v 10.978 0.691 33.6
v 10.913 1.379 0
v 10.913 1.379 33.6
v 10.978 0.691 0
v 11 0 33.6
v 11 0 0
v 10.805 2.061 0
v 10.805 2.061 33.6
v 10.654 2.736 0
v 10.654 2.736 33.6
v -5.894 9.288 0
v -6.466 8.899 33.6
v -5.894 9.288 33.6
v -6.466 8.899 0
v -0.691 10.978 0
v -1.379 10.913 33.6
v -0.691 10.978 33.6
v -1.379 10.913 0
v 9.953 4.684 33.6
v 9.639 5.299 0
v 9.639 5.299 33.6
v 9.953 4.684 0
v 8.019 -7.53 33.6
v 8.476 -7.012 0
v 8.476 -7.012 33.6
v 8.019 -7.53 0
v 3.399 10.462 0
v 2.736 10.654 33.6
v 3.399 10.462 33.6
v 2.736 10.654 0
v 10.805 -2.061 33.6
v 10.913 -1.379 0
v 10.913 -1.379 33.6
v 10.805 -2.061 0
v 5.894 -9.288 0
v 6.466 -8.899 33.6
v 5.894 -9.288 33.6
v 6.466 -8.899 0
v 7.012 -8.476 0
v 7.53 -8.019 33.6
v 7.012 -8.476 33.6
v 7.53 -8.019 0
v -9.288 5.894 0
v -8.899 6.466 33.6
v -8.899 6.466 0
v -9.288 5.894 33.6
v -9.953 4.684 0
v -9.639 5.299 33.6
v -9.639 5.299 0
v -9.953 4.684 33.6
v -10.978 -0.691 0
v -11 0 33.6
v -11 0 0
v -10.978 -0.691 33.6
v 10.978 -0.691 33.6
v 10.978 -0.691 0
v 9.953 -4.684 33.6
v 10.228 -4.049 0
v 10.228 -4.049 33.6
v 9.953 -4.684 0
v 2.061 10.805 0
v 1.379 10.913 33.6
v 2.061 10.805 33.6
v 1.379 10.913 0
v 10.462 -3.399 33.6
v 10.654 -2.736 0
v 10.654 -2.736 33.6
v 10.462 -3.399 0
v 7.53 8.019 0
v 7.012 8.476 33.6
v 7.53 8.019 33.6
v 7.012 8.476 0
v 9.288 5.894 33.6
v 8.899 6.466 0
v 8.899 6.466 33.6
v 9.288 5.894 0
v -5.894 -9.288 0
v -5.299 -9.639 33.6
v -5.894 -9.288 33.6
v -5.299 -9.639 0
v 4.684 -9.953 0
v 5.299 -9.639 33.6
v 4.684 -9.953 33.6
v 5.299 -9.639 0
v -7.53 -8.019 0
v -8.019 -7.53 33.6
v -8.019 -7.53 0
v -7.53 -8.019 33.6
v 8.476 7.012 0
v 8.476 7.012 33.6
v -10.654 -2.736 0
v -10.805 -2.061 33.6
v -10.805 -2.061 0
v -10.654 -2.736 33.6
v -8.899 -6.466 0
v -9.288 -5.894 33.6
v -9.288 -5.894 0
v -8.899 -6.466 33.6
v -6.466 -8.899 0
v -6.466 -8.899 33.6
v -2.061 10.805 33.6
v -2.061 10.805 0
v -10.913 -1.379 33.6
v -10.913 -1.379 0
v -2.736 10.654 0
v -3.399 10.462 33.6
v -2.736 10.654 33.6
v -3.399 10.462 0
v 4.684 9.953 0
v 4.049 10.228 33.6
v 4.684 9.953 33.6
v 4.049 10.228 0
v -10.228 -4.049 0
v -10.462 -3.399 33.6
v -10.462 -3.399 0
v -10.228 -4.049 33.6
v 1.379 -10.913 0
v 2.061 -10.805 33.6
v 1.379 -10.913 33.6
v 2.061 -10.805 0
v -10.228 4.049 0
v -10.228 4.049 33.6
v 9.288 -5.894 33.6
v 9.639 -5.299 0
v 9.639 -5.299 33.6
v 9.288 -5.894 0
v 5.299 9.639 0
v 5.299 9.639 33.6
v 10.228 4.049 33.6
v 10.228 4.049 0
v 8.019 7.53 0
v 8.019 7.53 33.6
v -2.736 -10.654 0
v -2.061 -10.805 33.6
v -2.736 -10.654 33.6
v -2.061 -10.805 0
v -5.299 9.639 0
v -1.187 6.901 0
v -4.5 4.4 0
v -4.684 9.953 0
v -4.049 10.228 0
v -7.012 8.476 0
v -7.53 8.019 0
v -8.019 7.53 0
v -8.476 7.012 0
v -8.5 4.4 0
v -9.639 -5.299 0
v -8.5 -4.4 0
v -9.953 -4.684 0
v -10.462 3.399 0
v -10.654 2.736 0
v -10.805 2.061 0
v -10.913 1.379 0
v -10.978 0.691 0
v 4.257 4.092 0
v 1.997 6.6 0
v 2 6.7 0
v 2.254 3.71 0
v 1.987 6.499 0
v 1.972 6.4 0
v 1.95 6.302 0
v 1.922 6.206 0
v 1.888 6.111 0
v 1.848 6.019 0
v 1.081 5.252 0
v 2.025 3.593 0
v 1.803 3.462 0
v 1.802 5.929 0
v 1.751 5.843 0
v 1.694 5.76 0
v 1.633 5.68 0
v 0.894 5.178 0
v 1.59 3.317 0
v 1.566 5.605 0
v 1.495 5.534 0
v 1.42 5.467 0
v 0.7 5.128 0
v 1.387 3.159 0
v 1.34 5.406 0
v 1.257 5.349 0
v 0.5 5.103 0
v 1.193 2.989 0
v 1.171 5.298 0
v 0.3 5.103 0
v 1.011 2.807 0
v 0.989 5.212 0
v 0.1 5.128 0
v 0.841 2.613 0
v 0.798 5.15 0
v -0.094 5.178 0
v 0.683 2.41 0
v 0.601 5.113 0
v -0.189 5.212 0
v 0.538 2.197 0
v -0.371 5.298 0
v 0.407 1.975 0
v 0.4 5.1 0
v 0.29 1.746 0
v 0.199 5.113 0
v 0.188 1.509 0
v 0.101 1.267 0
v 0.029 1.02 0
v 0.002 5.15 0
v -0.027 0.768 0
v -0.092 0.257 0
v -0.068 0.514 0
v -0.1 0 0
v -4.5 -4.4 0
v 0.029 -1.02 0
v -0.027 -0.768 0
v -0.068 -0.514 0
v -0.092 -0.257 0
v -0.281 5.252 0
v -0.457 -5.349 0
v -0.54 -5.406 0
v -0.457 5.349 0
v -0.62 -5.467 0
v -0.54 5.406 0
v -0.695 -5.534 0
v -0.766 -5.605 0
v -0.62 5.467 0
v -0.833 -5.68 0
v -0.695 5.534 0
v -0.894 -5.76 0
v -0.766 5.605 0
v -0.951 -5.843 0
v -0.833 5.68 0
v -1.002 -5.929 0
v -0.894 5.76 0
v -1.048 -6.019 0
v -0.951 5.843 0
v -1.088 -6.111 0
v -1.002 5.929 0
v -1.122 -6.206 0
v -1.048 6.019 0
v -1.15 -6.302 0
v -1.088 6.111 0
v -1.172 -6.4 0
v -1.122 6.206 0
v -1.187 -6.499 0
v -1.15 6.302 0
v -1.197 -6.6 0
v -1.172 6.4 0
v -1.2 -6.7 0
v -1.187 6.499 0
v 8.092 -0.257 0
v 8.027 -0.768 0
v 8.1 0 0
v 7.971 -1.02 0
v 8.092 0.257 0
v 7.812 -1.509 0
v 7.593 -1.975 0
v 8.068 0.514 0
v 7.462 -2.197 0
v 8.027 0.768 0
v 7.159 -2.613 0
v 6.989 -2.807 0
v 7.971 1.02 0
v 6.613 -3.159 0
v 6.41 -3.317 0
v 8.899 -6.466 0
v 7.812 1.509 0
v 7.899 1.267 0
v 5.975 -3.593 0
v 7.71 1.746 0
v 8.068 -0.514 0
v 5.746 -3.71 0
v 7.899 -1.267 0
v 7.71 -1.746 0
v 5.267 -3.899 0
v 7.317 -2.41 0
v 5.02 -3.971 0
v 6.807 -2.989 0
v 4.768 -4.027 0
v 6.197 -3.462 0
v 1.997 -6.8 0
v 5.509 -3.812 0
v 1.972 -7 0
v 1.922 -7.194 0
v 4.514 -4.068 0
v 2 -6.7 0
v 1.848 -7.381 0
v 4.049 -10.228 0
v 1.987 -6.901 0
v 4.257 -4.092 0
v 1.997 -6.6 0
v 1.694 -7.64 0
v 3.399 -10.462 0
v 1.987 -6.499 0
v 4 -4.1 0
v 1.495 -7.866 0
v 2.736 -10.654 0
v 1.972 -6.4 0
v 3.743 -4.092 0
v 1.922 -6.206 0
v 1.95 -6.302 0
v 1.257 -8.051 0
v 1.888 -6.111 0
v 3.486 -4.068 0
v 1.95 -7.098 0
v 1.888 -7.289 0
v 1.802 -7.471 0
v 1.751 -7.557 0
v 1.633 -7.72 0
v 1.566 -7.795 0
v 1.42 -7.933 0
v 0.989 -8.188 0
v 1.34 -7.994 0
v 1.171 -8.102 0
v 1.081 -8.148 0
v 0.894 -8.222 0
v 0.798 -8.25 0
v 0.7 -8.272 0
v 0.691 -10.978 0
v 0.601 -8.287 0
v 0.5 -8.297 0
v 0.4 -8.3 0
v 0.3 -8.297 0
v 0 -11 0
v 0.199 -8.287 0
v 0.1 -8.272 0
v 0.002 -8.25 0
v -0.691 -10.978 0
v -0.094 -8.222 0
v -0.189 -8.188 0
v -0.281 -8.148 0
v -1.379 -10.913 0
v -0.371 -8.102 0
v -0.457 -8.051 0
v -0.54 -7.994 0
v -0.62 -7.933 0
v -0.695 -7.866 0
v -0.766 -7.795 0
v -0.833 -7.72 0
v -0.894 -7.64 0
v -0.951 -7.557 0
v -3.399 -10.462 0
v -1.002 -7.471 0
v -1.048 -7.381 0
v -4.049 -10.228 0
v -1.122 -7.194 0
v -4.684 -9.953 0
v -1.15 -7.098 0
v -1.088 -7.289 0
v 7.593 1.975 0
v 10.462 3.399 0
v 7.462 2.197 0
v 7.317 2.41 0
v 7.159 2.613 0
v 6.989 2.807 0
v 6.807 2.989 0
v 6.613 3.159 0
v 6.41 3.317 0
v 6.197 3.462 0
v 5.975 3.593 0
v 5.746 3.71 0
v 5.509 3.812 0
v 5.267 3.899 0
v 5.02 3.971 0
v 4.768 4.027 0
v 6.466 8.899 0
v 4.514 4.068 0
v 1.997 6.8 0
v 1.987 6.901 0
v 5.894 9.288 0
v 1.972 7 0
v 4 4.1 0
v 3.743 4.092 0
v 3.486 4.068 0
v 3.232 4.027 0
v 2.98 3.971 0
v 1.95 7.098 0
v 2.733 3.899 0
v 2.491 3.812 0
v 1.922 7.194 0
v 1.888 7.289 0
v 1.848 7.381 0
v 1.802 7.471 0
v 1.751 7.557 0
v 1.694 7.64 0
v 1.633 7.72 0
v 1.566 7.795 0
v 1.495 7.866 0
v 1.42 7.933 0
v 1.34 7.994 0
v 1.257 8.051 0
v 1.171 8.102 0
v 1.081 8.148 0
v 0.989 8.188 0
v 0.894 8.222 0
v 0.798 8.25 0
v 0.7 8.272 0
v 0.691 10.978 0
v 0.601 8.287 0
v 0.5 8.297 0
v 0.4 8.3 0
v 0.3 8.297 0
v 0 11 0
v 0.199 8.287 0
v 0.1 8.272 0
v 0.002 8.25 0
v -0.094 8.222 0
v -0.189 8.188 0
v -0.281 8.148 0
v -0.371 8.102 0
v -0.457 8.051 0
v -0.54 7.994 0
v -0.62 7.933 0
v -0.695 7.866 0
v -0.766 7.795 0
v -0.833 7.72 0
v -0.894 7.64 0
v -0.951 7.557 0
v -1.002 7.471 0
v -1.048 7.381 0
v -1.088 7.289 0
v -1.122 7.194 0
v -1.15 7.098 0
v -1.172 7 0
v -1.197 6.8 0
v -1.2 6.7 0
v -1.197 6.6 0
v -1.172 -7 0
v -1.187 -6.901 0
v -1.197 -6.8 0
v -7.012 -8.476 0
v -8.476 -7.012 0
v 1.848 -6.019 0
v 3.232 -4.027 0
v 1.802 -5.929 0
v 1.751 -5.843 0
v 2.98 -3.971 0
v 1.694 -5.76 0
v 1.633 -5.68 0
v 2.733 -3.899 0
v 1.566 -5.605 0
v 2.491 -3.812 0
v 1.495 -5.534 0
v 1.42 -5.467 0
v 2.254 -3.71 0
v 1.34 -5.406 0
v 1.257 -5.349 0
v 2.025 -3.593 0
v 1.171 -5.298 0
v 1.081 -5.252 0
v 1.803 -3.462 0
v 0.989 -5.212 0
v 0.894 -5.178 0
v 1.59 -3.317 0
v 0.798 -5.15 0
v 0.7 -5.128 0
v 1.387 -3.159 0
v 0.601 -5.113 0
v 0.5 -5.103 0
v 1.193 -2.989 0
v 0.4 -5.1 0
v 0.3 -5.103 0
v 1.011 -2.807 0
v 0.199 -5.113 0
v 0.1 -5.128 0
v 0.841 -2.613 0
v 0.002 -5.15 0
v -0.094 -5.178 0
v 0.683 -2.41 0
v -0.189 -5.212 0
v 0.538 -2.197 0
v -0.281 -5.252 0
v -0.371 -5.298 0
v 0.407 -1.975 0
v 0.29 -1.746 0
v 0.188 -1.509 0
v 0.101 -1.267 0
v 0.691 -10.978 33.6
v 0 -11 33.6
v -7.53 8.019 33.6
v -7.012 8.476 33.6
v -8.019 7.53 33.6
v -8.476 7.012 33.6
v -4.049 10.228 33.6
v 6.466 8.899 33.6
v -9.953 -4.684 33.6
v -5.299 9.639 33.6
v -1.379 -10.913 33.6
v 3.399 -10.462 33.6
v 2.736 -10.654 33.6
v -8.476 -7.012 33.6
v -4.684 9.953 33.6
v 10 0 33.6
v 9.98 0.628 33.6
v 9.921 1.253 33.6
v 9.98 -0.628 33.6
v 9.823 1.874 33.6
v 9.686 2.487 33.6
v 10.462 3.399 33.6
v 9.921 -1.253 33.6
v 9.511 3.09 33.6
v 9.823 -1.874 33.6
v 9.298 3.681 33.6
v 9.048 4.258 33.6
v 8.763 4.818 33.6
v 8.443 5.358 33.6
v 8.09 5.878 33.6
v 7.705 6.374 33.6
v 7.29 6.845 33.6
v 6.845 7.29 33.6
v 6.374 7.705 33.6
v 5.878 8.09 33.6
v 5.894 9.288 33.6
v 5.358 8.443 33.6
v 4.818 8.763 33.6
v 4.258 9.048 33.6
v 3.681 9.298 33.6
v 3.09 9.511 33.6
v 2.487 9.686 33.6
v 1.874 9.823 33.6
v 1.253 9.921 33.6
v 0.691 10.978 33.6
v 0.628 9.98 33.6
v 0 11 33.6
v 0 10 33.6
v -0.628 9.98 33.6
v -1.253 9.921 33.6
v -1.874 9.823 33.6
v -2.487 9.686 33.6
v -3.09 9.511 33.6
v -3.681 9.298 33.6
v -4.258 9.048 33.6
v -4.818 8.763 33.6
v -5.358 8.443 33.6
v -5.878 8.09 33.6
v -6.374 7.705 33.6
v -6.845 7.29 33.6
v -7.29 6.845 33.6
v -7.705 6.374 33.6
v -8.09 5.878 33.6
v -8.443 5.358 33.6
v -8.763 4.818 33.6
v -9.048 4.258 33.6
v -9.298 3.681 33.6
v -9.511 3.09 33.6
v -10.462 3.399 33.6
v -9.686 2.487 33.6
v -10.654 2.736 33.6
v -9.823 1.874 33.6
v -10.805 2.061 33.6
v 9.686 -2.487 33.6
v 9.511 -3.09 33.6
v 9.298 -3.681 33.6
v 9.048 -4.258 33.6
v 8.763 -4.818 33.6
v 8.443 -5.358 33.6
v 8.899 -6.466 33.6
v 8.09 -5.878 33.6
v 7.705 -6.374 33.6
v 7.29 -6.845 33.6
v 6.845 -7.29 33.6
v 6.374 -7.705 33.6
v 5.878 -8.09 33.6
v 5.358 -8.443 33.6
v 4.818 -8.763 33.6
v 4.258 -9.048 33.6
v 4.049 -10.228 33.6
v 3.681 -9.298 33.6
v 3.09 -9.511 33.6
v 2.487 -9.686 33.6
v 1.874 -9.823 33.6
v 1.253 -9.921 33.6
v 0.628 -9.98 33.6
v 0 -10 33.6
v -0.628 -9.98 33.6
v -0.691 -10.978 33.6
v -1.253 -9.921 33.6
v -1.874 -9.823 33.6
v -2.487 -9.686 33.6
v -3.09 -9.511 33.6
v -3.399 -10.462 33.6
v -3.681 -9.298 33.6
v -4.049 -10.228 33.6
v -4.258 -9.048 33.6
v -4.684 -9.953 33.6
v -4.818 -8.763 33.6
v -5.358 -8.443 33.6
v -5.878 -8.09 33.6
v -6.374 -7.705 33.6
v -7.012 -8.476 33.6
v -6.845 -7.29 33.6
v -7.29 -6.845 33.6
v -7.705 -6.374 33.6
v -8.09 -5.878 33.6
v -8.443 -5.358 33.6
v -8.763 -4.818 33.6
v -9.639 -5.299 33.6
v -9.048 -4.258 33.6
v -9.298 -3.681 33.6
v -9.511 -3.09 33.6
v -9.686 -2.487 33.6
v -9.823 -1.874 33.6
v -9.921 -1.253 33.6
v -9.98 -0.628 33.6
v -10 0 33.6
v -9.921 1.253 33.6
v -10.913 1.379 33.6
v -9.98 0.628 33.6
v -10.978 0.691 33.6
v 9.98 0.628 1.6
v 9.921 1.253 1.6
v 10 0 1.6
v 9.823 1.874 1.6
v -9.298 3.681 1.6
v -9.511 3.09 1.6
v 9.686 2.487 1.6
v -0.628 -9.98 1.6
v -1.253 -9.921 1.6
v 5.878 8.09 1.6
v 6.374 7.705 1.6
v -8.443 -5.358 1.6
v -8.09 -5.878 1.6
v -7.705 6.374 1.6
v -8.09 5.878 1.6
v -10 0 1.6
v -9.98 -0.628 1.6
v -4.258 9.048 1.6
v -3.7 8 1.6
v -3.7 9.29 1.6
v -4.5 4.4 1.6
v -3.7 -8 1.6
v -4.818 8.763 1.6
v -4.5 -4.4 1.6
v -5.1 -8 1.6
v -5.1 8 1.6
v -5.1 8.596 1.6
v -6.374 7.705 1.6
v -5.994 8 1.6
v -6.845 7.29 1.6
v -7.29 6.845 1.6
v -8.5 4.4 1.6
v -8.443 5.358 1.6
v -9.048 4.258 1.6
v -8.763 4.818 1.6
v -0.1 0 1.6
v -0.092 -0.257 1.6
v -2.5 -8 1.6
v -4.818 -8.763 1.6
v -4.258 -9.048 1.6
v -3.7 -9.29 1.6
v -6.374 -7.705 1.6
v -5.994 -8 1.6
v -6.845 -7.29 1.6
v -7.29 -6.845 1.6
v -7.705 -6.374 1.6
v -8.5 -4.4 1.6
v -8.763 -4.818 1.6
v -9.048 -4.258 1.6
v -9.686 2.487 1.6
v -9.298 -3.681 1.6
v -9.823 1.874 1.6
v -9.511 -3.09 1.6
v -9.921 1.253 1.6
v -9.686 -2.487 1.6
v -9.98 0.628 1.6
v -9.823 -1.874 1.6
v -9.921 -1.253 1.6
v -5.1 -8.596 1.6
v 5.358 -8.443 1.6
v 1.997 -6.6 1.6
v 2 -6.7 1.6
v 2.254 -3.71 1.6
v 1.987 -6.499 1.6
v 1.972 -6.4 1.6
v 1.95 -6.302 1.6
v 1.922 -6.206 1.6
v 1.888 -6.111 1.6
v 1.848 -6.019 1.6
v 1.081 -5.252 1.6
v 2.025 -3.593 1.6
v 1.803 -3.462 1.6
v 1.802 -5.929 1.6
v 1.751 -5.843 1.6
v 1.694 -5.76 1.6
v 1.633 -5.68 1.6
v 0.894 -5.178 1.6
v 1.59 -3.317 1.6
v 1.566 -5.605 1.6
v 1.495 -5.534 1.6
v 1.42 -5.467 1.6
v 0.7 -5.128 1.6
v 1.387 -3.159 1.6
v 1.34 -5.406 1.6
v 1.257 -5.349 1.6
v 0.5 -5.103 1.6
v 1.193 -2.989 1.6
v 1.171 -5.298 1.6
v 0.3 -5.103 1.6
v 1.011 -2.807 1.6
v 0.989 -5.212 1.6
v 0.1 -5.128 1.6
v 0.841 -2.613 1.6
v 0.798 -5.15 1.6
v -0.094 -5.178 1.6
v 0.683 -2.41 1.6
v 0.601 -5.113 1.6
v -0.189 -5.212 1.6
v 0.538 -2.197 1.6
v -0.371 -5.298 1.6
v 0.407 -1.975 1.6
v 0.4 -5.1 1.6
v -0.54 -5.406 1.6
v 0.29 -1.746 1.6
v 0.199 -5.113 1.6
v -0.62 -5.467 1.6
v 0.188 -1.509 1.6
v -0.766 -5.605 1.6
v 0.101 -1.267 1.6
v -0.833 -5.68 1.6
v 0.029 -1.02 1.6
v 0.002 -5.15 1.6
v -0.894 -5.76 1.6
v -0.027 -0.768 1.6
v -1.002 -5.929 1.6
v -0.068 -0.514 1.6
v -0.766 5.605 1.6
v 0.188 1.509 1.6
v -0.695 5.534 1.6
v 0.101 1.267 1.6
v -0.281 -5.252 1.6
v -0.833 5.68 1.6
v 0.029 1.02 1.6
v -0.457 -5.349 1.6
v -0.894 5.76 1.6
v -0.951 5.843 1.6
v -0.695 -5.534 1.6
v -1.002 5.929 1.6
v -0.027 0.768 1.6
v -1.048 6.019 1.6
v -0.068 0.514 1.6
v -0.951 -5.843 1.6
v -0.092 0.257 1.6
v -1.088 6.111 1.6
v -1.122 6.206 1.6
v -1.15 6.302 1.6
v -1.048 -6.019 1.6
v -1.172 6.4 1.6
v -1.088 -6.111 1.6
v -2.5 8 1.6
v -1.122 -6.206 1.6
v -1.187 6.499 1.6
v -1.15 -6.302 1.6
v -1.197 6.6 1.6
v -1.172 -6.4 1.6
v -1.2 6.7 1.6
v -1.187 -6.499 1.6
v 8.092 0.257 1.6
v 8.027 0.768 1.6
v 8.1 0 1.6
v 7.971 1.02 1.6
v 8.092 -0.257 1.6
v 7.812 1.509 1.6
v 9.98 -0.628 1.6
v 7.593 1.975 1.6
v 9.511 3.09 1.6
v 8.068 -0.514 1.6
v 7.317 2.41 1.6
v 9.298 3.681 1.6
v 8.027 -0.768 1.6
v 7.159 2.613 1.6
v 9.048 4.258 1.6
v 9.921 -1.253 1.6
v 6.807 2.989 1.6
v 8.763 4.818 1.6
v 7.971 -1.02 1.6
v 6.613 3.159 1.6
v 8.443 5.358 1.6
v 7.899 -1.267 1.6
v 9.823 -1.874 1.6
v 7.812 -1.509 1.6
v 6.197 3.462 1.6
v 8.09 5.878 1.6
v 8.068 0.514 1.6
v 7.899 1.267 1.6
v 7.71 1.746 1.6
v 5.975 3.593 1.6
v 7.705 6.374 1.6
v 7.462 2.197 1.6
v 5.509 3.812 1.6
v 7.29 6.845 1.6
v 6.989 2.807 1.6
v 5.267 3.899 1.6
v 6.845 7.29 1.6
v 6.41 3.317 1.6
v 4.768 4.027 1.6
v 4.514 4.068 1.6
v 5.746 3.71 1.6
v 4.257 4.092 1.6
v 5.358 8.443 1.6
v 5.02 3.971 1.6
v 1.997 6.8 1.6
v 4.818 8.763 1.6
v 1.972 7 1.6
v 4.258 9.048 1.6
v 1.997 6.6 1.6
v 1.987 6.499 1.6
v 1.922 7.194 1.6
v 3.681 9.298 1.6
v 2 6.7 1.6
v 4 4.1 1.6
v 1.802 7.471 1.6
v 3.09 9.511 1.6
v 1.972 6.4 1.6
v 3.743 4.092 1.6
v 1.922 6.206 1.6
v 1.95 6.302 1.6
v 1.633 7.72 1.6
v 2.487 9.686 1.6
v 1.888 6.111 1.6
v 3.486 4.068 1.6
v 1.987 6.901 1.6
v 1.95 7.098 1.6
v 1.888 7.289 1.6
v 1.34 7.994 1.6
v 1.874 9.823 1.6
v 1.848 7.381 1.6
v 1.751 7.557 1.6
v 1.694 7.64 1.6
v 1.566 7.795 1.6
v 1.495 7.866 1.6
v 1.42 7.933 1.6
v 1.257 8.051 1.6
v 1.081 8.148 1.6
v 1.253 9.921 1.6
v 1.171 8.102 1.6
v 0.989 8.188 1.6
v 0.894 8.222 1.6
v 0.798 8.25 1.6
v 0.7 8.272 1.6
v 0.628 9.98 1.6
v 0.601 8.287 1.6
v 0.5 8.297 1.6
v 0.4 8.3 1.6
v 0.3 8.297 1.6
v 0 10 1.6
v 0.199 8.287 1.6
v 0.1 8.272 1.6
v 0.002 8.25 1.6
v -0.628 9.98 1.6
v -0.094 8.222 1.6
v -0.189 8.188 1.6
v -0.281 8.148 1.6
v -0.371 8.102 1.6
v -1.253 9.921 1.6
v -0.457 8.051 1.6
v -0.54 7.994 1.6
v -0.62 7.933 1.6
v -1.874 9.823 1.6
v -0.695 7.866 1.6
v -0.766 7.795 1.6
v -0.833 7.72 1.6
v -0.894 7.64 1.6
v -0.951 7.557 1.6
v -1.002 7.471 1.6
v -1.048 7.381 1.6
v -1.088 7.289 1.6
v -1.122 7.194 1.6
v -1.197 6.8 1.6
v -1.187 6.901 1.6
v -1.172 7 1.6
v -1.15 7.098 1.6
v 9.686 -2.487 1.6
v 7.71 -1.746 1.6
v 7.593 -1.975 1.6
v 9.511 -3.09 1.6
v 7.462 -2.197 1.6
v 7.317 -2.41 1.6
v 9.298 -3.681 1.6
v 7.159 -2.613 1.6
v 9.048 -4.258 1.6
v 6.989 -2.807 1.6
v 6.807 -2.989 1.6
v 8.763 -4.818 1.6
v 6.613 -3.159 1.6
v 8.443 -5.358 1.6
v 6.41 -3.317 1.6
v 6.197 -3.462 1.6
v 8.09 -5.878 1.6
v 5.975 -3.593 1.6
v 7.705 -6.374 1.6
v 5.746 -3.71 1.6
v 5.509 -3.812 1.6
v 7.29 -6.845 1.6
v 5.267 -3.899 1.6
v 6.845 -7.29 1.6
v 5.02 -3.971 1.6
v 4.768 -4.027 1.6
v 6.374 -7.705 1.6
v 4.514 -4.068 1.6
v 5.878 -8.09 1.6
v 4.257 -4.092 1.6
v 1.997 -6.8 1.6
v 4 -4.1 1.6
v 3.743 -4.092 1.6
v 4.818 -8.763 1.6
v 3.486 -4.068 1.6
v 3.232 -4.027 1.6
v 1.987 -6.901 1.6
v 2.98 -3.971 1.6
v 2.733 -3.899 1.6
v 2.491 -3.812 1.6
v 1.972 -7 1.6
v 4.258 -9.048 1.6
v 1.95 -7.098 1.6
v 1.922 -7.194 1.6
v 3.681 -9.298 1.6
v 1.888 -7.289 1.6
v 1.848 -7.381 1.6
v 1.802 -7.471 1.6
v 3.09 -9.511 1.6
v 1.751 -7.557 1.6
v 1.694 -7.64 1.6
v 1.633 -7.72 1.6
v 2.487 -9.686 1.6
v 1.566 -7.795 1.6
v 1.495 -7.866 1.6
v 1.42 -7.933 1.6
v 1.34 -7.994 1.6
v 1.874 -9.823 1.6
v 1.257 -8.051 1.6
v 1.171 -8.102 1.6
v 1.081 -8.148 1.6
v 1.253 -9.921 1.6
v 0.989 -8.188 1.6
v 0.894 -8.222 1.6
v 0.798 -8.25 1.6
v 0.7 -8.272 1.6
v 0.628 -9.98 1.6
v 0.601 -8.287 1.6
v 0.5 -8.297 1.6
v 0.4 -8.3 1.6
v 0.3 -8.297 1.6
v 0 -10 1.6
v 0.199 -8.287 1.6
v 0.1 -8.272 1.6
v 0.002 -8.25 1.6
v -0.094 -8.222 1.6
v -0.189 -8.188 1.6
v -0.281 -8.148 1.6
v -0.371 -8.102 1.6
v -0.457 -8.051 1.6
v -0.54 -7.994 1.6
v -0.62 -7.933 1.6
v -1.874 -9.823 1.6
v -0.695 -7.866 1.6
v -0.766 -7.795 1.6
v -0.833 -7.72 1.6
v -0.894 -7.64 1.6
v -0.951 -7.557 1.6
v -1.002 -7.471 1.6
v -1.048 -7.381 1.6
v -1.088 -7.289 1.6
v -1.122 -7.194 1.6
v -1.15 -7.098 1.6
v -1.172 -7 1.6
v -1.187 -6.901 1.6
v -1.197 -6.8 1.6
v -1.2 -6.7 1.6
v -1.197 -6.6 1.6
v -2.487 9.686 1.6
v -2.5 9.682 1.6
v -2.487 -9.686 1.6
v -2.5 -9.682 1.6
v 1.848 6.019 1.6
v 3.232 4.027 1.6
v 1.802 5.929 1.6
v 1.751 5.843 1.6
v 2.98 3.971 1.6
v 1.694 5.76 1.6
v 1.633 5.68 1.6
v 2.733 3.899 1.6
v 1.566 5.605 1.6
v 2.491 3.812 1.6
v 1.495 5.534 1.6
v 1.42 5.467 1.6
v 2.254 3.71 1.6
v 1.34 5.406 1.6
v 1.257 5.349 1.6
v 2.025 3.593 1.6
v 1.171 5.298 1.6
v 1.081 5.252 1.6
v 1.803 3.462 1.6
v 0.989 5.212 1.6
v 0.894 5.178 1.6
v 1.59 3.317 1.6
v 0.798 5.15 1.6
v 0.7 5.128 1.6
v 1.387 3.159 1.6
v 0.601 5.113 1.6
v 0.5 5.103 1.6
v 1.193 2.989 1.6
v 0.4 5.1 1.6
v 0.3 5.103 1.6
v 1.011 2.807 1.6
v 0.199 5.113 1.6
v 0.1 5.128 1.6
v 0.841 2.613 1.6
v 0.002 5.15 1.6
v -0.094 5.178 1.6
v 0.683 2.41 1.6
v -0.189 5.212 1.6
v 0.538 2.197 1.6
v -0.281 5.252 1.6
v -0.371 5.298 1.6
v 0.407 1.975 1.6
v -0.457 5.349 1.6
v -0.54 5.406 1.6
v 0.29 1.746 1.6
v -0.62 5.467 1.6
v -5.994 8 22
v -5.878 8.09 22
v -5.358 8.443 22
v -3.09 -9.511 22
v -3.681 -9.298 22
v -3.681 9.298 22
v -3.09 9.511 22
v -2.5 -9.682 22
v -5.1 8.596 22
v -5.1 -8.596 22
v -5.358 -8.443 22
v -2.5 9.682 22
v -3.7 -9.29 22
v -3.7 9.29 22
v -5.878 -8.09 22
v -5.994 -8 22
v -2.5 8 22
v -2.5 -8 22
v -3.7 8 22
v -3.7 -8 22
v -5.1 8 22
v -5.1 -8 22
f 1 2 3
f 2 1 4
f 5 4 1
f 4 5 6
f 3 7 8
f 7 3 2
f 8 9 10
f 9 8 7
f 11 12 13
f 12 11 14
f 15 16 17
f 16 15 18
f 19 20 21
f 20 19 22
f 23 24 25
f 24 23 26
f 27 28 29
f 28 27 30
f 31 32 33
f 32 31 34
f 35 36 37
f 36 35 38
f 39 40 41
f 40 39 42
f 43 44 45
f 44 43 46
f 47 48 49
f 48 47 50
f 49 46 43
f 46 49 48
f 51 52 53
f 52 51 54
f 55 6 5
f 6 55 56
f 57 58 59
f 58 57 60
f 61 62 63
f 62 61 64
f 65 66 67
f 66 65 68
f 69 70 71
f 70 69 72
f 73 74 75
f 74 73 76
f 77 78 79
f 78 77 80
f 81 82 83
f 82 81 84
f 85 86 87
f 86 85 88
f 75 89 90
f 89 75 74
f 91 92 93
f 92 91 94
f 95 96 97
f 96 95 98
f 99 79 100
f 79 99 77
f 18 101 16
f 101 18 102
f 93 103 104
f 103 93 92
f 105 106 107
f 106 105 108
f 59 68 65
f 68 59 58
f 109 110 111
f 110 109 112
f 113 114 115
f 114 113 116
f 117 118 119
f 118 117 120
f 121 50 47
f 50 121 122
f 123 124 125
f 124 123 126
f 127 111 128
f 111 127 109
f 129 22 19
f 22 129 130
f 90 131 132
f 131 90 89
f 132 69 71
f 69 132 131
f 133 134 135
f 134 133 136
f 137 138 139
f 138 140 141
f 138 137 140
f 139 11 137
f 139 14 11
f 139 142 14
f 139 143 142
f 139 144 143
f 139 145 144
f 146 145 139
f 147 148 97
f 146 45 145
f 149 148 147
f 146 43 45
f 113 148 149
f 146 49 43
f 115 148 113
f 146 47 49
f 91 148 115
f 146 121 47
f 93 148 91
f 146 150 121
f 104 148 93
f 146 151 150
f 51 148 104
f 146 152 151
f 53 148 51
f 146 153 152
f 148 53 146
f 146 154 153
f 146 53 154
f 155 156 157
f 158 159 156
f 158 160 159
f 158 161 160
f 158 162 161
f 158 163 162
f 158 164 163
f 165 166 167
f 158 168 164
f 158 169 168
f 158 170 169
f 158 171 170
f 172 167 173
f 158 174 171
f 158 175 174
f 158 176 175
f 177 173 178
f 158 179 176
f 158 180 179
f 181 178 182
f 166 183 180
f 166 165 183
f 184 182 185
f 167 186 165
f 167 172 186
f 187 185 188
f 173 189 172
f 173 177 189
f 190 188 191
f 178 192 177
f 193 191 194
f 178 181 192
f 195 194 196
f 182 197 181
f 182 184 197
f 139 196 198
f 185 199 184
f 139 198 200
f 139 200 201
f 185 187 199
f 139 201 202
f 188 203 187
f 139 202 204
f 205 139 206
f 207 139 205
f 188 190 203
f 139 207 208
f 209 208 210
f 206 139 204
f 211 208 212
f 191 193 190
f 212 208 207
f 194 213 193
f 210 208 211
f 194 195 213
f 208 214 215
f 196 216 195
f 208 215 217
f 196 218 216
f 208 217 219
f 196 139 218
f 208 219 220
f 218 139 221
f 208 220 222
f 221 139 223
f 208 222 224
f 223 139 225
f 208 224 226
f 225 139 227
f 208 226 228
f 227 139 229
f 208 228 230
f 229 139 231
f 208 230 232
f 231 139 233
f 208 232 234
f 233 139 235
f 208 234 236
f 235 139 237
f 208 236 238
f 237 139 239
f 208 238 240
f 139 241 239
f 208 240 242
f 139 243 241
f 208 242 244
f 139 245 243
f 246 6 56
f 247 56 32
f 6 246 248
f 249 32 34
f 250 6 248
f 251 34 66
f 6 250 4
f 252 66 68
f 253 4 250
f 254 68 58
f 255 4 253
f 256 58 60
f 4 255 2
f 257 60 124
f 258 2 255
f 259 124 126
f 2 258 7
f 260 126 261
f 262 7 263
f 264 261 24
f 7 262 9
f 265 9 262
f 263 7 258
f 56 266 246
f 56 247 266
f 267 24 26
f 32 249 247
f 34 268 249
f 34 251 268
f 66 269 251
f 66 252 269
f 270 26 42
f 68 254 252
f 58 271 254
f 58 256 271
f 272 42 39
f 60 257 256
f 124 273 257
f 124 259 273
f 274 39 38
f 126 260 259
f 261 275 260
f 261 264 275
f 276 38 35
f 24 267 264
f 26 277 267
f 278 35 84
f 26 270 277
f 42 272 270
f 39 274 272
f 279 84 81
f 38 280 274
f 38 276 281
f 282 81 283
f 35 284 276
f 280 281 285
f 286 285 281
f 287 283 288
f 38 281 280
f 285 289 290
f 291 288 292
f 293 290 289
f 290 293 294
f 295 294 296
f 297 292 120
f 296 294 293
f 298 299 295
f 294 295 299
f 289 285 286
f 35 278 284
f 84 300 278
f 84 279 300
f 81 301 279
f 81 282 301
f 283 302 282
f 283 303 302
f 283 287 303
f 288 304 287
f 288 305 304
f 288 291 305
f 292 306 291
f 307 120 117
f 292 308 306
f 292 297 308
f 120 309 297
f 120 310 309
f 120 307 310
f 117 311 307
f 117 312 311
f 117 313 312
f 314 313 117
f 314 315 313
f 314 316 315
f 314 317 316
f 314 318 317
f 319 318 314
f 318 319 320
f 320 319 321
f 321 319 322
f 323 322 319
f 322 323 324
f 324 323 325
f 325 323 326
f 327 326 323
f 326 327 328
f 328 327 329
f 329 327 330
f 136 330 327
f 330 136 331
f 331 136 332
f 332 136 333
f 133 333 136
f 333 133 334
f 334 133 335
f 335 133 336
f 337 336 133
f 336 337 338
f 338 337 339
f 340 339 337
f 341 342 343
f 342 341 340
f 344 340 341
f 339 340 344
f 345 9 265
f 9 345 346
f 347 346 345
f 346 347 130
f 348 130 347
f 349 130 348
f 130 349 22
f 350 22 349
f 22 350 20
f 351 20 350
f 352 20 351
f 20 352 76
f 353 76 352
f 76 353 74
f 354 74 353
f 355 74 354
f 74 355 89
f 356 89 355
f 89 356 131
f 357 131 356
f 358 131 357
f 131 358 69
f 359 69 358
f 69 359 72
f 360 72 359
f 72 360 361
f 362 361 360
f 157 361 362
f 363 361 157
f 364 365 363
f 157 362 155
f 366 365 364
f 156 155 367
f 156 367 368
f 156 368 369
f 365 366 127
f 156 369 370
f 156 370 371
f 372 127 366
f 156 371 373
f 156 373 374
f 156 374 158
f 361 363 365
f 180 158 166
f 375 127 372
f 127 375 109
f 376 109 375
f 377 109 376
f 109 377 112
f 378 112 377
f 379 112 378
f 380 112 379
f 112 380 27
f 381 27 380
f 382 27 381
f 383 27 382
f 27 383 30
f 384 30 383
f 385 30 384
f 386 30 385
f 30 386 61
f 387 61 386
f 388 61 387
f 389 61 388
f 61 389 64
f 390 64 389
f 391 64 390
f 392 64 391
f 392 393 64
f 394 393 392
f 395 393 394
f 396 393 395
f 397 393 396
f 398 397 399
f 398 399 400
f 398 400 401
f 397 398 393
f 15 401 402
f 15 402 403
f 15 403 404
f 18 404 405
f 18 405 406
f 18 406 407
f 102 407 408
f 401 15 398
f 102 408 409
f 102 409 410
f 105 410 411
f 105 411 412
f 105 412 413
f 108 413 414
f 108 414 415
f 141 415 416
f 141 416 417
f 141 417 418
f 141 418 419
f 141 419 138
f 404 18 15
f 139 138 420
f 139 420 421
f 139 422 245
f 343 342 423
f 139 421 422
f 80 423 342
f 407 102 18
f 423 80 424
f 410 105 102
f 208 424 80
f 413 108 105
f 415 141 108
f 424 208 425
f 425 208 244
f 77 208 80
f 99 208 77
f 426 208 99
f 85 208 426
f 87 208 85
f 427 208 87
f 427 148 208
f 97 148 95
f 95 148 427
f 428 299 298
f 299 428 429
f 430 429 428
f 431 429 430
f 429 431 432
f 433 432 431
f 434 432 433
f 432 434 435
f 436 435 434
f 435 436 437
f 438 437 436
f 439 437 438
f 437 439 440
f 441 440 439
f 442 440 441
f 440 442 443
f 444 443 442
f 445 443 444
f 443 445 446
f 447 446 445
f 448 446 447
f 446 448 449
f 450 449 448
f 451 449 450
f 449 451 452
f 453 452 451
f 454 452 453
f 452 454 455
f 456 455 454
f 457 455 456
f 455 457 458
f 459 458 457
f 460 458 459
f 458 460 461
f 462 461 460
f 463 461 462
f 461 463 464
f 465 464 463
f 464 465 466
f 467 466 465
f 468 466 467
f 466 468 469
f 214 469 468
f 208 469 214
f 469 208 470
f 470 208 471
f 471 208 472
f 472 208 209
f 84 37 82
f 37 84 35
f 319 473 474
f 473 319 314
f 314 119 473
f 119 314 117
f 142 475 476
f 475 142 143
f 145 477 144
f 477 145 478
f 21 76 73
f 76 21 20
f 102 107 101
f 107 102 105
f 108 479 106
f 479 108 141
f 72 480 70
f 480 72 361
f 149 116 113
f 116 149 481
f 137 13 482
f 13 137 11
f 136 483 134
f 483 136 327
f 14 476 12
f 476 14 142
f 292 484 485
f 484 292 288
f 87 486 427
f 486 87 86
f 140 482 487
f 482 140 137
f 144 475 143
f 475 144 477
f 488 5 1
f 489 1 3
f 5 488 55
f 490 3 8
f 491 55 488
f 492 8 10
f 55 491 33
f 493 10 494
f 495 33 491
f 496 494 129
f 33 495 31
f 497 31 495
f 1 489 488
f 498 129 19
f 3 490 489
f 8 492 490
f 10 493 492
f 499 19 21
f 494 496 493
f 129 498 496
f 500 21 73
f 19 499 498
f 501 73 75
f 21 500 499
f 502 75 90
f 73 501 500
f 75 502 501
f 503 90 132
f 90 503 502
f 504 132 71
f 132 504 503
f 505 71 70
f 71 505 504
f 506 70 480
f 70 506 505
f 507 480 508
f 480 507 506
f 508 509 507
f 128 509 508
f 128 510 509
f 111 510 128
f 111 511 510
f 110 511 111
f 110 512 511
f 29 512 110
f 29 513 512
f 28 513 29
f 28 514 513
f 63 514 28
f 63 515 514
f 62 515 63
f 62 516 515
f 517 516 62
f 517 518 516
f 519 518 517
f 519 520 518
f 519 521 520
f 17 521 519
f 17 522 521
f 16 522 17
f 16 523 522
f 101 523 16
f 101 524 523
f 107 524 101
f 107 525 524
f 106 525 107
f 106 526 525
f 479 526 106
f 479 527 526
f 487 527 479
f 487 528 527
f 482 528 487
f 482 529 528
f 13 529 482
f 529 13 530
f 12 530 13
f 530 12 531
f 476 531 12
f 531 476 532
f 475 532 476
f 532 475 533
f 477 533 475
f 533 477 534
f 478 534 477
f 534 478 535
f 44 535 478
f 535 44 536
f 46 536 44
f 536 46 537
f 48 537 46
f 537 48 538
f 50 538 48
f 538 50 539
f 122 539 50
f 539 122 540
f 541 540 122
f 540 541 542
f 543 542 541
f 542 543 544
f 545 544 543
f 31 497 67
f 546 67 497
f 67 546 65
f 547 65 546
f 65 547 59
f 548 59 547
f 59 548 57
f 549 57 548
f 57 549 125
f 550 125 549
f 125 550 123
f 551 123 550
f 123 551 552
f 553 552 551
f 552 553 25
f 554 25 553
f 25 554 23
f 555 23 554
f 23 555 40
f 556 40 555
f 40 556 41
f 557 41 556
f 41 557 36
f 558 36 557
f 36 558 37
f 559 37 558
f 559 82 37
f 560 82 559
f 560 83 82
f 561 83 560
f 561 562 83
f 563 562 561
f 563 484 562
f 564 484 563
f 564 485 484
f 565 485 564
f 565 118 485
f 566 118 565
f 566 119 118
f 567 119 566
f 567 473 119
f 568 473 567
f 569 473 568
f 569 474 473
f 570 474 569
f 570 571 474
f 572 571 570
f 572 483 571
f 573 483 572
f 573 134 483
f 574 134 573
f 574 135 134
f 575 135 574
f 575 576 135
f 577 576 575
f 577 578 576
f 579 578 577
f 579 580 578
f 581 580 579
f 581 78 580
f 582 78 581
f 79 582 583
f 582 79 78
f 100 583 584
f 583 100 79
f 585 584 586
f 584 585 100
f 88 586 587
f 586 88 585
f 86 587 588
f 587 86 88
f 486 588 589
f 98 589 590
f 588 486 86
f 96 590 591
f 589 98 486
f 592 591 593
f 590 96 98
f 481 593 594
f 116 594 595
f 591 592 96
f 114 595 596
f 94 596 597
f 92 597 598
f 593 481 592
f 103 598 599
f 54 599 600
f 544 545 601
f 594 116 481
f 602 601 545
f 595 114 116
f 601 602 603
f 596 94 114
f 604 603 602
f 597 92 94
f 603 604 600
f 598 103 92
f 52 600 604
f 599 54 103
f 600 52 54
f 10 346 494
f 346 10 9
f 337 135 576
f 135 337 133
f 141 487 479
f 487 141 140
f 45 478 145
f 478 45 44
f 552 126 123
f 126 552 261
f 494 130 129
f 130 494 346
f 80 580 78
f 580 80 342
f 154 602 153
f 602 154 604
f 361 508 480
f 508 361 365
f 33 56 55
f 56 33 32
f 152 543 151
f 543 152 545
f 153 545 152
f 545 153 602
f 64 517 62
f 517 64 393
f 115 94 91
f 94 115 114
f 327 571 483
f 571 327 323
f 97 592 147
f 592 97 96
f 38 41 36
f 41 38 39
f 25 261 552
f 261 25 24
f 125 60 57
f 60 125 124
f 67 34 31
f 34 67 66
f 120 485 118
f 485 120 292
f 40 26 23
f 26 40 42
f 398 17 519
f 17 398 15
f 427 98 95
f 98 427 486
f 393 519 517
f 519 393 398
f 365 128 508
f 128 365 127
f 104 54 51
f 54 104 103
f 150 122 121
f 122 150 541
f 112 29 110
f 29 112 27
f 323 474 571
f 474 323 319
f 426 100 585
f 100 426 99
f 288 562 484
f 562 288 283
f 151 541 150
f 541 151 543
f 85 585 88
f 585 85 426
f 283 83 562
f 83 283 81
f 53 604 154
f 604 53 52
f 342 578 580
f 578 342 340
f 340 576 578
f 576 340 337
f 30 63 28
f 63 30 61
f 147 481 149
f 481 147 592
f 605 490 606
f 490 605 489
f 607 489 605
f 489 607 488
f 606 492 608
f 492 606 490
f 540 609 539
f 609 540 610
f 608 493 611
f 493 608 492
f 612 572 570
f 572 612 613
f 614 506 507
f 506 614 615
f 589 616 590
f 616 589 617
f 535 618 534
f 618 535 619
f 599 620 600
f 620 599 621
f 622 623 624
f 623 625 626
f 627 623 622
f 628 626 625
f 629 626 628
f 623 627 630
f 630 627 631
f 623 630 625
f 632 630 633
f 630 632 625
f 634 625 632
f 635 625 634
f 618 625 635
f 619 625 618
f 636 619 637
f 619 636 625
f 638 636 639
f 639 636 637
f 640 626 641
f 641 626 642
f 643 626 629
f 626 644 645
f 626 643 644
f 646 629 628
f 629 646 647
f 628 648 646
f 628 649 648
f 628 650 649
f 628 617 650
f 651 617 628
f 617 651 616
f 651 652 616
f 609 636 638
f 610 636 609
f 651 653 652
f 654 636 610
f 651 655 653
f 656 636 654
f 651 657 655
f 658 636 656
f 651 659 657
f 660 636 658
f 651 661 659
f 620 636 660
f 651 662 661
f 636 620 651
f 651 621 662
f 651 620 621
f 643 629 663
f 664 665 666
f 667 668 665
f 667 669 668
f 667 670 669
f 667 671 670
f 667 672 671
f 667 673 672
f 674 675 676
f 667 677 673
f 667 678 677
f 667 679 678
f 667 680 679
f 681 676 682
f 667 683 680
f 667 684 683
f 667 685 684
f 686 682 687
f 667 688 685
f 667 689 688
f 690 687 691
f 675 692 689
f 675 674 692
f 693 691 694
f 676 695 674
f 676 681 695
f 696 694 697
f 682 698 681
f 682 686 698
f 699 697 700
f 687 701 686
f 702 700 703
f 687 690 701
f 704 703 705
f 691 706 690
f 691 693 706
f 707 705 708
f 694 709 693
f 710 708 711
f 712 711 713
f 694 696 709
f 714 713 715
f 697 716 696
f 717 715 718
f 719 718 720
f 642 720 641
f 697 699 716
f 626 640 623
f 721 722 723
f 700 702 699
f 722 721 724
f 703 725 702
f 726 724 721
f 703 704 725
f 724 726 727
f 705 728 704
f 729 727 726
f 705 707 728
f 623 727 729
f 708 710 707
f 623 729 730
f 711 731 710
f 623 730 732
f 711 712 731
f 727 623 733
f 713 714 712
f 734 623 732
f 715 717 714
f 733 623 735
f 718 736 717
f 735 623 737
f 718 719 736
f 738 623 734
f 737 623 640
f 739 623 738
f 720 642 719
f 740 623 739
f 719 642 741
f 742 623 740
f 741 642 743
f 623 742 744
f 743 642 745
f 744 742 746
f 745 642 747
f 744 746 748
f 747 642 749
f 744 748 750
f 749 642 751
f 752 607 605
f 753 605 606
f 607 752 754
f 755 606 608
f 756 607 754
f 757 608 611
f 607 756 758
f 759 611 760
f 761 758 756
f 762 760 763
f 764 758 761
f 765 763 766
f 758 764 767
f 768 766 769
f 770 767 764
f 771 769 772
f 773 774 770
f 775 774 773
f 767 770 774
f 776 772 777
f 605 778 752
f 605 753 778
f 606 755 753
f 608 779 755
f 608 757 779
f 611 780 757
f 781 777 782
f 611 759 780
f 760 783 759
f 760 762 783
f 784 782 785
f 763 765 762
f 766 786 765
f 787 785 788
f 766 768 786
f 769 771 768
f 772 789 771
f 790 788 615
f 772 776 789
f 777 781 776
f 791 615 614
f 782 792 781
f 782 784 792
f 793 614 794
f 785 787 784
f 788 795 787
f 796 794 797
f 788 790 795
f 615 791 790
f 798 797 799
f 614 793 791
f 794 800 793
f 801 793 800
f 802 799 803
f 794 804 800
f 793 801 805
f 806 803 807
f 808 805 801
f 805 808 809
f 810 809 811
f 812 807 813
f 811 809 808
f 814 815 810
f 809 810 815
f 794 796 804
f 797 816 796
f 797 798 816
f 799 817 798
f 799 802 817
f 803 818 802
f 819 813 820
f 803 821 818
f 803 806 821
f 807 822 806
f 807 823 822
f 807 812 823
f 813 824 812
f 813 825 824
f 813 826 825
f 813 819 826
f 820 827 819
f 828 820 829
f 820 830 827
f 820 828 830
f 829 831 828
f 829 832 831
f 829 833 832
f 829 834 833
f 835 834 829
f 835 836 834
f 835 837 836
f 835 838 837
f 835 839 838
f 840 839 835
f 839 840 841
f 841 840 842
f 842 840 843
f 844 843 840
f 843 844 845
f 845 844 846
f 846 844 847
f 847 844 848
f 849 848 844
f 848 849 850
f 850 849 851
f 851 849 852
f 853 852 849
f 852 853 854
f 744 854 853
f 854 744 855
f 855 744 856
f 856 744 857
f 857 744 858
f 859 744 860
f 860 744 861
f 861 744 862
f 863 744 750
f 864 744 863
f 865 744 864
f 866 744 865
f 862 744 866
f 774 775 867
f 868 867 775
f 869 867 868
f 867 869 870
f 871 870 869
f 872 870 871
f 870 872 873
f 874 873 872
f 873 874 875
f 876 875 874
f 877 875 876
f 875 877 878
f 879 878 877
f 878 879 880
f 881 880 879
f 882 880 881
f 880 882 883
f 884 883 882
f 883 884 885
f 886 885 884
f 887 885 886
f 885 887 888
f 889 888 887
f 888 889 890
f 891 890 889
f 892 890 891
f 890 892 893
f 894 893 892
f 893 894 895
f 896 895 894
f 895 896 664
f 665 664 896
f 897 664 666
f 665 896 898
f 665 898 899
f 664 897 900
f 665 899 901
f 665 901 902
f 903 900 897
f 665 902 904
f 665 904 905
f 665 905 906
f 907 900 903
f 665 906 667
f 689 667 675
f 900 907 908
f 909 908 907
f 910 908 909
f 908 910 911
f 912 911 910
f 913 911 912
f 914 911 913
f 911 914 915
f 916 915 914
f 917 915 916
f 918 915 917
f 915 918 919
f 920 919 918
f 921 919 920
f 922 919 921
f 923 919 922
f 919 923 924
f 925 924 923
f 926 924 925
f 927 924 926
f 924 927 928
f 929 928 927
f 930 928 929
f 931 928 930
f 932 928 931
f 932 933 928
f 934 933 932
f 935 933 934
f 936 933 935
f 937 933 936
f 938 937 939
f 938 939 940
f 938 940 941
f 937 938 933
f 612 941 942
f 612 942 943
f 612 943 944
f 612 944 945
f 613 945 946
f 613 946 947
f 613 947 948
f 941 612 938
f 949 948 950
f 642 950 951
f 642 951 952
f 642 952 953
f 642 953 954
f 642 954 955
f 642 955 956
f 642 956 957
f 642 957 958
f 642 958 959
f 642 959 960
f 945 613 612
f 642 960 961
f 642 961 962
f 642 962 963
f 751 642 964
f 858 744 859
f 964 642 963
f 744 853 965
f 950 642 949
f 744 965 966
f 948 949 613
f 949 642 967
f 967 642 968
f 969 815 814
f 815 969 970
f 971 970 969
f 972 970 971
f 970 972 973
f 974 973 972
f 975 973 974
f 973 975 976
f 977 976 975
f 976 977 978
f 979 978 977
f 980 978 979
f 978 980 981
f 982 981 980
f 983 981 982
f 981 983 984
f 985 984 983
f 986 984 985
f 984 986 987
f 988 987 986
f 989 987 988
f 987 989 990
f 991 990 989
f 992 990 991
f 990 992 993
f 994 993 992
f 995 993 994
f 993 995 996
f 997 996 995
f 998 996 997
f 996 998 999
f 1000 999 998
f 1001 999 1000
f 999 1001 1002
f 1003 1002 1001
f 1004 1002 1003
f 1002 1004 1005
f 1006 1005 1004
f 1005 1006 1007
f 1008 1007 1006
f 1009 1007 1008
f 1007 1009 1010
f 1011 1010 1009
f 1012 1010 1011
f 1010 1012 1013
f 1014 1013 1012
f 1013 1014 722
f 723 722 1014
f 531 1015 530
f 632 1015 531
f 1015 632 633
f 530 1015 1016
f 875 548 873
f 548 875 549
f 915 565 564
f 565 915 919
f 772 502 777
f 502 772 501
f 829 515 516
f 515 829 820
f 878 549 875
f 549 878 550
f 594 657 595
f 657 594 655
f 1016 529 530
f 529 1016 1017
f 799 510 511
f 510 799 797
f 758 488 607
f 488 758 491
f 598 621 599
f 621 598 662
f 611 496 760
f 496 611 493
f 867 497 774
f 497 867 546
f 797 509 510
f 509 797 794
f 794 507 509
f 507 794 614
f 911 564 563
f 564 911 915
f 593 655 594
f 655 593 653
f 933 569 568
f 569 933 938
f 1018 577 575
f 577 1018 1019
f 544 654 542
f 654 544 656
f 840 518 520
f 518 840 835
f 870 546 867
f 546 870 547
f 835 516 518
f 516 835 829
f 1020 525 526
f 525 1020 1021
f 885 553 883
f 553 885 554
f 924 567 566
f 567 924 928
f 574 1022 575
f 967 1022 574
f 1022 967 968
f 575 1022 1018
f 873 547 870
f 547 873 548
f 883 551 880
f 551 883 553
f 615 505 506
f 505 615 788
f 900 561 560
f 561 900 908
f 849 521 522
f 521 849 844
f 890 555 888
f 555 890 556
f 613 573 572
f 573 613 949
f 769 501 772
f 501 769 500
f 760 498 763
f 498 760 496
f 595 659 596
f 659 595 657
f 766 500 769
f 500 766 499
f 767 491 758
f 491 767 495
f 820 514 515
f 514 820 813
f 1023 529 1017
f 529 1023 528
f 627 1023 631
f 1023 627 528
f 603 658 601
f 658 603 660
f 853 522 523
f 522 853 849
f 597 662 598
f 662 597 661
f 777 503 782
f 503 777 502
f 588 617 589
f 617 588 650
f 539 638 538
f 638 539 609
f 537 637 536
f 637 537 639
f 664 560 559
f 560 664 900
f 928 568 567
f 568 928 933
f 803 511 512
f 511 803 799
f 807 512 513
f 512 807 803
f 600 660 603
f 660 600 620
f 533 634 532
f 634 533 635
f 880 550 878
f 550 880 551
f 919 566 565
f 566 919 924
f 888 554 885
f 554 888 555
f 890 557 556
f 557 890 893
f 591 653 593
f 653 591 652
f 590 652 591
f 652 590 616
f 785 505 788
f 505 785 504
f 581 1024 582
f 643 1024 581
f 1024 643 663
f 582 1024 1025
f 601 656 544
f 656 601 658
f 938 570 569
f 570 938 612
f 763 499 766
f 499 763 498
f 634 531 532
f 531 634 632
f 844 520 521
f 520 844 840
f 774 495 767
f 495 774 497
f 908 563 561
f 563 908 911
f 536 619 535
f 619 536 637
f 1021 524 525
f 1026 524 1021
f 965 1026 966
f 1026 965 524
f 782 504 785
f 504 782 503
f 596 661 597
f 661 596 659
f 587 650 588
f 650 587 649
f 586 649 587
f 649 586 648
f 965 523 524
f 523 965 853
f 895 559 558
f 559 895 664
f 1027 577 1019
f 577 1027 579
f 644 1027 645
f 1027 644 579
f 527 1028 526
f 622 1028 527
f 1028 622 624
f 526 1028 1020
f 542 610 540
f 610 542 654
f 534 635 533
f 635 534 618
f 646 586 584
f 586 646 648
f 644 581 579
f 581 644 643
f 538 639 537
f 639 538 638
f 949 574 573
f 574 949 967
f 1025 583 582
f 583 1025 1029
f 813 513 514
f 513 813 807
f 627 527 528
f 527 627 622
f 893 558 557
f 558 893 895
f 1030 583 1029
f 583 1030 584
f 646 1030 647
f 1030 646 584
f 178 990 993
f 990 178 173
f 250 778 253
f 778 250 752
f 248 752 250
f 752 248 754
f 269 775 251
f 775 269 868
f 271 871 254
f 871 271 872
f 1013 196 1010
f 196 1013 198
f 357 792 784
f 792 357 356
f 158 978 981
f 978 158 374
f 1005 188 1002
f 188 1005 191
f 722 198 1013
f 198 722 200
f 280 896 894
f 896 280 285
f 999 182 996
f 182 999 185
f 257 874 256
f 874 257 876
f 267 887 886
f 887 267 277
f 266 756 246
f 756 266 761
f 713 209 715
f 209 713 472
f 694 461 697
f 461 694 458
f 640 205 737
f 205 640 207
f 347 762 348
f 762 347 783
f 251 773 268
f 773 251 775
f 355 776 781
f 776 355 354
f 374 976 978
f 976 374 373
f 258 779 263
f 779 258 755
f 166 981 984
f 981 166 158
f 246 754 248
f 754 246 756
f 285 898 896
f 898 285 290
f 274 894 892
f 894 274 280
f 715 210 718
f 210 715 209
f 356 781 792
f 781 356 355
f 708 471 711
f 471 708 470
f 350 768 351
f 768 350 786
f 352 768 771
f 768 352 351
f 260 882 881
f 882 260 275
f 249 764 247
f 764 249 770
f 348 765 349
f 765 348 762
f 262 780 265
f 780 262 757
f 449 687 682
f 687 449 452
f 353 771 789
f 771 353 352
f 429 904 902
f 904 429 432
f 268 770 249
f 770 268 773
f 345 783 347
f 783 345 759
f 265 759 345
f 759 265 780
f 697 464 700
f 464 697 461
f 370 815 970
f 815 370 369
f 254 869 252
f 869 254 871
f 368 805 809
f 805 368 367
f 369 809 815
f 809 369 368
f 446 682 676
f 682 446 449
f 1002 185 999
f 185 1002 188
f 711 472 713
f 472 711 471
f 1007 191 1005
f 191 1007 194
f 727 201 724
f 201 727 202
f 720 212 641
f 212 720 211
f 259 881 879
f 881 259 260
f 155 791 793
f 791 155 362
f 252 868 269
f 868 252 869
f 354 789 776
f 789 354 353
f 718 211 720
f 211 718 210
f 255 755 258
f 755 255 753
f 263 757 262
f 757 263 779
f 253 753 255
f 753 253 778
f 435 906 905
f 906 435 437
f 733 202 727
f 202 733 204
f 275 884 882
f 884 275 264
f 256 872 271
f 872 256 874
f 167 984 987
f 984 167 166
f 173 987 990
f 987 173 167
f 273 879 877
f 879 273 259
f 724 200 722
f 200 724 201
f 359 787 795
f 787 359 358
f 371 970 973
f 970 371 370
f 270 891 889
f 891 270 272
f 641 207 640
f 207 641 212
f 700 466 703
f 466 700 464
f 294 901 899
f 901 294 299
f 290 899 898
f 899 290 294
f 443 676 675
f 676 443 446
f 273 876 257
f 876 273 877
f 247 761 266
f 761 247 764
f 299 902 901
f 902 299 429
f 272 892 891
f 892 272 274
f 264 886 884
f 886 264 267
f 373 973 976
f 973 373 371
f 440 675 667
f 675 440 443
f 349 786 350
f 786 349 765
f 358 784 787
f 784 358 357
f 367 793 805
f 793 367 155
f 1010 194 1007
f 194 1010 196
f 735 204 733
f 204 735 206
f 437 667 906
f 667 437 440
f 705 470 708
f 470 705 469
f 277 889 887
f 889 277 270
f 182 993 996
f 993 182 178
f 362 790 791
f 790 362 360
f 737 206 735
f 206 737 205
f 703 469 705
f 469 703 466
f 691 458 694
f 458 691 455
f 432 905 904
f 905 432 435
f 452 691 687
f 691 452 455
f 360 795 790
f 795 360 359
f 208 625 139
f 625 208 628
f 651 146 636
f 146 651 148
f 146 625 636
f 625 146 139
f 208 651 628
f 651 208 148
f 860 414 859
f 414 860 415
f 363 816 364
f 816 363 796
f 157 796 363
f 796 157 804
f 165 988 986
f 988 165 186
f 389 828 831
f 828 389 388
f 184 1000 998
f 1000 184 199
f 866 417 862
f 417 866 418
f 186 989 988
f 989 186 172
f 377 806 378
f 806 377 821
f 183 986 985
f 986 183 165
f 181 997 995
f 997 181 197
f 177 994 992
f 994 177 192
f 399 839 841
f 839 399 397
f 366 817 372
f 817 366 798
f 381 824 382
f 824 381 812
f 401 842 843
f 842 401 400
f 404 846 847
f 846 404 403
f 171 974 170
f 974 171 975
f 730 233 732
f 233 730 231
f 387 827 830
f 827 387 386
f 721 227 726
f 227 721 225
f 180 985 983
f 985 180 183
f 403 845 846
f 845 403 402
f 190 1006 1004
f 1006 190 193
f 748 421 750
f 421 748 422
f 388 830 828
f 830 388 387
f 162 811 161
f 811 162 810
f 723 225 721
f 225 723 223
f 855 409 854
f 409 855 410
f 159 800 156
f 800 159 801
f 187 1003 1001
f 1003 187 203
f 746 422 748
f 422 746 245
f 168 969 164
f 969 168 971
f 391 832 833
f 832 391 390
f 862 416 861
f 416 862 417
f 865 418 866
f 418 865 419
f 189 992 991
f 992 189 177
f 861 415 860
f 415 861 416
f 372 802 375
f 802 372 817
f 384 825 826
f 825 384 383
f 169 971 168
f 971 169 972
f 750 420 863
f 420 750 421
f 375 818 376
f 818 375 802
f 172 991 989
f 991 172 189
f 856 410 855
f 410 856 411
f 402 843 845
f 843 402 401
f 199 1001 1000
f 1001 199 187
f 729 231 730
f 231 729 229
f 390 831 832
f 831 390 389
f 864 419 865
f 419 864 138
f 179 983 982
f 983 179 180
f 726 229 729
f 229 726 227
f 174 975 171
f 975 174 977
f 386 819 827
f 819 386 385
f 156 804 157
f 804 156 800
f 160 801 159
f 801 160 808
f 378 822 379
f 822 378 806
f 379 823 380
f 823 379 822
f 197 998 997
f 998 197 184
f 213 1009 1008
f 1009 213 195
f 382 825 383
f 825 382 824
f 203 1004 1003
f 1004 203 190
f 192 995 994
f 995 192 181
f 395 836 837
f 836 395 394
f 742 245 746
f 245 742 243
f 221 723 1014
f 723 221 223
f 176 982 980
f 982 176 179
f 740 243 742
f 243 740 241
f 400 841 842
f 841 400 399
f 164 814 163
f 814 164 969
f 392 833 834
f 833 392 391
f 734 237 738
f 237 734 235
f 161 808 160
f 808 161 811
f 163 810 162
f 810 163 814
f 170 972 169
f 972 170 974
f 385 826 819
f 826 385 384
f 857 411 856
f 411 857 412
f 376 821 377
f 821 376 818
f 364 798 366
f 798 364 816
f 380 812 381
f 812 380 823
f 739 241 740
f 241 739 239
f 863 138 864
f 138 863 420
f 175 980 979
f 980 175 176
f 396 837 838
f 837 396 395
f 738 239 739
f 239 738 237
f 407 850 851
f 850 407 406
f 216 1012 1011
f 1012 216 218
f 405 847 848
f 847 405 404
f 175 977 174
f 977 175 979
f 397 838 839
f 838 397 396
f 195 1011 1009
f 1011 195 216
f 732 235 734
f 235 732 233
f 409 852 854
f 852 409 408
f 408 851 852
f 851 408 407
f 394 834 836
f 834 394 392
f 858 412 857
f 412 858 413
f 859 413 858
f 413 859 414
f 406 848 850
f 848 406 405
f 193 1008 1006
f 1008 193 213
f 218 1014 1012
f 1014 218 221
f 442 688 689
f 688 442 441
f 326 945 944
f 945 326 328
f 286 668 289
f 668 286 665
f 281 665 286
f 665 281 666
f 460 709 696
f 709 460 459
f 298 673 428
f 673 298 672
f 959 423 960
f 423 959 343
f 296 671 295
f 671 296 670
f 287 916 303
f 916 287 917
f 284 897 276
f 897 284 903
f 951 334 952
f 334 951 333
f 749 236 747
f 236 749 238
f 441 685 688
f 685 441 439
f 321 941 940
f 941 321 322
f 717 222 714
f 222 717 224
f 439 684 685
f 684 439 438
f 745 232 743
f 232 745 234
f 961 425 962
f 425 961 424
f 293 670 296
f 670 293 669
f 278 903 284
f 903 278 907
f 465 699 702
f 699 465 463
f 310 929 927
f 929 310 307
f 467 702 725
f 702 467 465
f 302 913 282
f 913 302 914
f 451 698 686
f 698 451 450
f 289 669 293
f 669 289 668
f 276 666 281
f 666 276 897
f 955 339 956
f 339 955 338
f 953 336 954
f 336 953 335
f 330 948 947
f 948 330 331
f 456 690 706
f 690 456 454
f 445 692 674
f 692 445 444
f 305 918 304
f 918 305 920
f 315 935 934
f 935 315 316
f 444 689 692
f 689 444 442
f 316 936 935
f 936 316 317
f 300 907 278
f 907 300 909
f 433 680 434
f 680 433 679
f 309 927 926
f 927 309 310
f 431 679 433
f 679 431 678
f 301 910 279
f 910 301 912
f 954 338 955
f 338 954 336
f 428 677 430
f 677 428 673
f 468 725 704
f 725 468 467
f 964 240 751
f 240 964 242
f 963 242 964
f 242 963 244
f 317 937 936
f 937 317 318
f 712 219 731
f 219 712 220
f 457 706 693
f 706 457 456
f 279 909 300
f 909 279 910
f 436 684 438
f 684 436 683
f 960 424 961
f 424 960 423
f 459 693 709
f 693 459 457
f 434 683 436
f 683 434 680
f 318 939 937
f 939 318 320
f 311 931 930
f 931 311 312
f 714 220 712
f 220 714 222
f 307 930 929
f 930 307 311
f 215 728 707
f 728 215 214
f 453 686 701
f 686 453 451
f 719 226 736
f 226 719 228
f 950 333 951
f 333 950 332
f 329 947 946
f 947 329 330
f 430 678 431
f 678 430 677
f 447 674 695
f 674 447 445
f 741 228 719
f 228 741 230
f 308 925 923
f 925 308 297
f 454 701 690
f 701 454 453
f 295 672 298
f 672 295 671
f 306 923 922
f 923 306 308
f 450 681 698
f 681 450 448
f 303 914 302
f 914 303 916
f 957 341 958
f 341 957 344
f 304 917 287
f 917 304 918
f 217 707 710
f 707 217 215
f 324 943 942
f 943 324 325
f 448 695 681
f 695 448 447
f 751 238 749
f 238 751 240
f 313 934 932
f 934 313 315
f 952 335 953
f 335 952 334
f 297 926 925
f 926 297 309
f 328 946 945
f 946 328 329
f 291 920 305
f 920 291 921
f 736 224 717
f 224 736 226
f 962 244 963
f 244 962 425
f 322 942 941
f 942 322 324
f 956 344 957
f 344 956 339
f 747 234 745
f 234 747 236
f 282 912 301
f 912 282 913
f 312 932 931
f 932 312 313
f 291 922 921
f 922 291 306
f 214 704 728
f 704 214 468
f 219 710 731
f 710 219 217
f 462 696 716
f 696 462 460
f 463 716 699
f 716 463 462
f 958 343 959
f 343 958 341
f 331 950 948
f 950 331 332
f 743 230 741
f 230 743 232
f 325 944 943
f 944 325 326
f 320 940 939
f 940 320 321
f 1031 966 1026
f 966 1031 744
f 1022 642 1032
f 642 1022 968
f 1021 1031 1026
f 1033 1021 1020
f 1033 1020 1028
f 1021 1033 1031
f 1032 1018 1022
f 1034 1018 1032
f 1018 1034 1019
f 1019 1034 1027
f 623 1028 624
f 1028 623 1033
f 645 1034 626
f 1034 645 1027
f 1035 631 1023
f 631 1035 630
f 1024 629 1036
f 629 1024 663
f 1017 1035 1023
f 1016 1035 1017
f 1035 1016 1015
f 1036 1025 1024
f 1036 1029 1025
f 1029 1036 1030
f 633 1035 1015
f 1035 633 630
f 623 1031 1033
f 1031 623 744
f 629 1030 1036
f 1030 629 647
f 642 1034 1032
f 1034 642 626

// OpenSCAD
d=22;
t=1;

difference(){
union() {
difference() {
cylinder($fn=100, 33.6, d/2, d/2);
translate([0,0,1.6])
cylinder($fn=100, 33, d/2-t, d/2-t);
translate([4,0,-1])
cylinder($fn=100, 4, 4.1, 4.1);
translate([-8.5,-4.4,-1])
cube([4,8.8,4]);

translate([0.4,6.7,-1])
cylinder($fn=100, 4, 1.6, 1.6);
translate([0.4,-6.7,-1])
cylinder($fn=100, 4, 1.6, 1.6);
}

translate([-0.2,0,0])
difference() {
union() {
translate([-3.5,-d/2+1,0])
cube([1.2,d-2,22]);
translate([-6.3,-8.8,0])
cube([1.4,17.6,22]);
}
translate([-8,-8,-1])
cube([8,16,30]);
}
}

/*translate([0,0,10])
cylinder($fn=100, 20, 20, 20);*/
}

/*translate([-5.2,-8.5,0])
cube([1.5,17,8]);
*/
